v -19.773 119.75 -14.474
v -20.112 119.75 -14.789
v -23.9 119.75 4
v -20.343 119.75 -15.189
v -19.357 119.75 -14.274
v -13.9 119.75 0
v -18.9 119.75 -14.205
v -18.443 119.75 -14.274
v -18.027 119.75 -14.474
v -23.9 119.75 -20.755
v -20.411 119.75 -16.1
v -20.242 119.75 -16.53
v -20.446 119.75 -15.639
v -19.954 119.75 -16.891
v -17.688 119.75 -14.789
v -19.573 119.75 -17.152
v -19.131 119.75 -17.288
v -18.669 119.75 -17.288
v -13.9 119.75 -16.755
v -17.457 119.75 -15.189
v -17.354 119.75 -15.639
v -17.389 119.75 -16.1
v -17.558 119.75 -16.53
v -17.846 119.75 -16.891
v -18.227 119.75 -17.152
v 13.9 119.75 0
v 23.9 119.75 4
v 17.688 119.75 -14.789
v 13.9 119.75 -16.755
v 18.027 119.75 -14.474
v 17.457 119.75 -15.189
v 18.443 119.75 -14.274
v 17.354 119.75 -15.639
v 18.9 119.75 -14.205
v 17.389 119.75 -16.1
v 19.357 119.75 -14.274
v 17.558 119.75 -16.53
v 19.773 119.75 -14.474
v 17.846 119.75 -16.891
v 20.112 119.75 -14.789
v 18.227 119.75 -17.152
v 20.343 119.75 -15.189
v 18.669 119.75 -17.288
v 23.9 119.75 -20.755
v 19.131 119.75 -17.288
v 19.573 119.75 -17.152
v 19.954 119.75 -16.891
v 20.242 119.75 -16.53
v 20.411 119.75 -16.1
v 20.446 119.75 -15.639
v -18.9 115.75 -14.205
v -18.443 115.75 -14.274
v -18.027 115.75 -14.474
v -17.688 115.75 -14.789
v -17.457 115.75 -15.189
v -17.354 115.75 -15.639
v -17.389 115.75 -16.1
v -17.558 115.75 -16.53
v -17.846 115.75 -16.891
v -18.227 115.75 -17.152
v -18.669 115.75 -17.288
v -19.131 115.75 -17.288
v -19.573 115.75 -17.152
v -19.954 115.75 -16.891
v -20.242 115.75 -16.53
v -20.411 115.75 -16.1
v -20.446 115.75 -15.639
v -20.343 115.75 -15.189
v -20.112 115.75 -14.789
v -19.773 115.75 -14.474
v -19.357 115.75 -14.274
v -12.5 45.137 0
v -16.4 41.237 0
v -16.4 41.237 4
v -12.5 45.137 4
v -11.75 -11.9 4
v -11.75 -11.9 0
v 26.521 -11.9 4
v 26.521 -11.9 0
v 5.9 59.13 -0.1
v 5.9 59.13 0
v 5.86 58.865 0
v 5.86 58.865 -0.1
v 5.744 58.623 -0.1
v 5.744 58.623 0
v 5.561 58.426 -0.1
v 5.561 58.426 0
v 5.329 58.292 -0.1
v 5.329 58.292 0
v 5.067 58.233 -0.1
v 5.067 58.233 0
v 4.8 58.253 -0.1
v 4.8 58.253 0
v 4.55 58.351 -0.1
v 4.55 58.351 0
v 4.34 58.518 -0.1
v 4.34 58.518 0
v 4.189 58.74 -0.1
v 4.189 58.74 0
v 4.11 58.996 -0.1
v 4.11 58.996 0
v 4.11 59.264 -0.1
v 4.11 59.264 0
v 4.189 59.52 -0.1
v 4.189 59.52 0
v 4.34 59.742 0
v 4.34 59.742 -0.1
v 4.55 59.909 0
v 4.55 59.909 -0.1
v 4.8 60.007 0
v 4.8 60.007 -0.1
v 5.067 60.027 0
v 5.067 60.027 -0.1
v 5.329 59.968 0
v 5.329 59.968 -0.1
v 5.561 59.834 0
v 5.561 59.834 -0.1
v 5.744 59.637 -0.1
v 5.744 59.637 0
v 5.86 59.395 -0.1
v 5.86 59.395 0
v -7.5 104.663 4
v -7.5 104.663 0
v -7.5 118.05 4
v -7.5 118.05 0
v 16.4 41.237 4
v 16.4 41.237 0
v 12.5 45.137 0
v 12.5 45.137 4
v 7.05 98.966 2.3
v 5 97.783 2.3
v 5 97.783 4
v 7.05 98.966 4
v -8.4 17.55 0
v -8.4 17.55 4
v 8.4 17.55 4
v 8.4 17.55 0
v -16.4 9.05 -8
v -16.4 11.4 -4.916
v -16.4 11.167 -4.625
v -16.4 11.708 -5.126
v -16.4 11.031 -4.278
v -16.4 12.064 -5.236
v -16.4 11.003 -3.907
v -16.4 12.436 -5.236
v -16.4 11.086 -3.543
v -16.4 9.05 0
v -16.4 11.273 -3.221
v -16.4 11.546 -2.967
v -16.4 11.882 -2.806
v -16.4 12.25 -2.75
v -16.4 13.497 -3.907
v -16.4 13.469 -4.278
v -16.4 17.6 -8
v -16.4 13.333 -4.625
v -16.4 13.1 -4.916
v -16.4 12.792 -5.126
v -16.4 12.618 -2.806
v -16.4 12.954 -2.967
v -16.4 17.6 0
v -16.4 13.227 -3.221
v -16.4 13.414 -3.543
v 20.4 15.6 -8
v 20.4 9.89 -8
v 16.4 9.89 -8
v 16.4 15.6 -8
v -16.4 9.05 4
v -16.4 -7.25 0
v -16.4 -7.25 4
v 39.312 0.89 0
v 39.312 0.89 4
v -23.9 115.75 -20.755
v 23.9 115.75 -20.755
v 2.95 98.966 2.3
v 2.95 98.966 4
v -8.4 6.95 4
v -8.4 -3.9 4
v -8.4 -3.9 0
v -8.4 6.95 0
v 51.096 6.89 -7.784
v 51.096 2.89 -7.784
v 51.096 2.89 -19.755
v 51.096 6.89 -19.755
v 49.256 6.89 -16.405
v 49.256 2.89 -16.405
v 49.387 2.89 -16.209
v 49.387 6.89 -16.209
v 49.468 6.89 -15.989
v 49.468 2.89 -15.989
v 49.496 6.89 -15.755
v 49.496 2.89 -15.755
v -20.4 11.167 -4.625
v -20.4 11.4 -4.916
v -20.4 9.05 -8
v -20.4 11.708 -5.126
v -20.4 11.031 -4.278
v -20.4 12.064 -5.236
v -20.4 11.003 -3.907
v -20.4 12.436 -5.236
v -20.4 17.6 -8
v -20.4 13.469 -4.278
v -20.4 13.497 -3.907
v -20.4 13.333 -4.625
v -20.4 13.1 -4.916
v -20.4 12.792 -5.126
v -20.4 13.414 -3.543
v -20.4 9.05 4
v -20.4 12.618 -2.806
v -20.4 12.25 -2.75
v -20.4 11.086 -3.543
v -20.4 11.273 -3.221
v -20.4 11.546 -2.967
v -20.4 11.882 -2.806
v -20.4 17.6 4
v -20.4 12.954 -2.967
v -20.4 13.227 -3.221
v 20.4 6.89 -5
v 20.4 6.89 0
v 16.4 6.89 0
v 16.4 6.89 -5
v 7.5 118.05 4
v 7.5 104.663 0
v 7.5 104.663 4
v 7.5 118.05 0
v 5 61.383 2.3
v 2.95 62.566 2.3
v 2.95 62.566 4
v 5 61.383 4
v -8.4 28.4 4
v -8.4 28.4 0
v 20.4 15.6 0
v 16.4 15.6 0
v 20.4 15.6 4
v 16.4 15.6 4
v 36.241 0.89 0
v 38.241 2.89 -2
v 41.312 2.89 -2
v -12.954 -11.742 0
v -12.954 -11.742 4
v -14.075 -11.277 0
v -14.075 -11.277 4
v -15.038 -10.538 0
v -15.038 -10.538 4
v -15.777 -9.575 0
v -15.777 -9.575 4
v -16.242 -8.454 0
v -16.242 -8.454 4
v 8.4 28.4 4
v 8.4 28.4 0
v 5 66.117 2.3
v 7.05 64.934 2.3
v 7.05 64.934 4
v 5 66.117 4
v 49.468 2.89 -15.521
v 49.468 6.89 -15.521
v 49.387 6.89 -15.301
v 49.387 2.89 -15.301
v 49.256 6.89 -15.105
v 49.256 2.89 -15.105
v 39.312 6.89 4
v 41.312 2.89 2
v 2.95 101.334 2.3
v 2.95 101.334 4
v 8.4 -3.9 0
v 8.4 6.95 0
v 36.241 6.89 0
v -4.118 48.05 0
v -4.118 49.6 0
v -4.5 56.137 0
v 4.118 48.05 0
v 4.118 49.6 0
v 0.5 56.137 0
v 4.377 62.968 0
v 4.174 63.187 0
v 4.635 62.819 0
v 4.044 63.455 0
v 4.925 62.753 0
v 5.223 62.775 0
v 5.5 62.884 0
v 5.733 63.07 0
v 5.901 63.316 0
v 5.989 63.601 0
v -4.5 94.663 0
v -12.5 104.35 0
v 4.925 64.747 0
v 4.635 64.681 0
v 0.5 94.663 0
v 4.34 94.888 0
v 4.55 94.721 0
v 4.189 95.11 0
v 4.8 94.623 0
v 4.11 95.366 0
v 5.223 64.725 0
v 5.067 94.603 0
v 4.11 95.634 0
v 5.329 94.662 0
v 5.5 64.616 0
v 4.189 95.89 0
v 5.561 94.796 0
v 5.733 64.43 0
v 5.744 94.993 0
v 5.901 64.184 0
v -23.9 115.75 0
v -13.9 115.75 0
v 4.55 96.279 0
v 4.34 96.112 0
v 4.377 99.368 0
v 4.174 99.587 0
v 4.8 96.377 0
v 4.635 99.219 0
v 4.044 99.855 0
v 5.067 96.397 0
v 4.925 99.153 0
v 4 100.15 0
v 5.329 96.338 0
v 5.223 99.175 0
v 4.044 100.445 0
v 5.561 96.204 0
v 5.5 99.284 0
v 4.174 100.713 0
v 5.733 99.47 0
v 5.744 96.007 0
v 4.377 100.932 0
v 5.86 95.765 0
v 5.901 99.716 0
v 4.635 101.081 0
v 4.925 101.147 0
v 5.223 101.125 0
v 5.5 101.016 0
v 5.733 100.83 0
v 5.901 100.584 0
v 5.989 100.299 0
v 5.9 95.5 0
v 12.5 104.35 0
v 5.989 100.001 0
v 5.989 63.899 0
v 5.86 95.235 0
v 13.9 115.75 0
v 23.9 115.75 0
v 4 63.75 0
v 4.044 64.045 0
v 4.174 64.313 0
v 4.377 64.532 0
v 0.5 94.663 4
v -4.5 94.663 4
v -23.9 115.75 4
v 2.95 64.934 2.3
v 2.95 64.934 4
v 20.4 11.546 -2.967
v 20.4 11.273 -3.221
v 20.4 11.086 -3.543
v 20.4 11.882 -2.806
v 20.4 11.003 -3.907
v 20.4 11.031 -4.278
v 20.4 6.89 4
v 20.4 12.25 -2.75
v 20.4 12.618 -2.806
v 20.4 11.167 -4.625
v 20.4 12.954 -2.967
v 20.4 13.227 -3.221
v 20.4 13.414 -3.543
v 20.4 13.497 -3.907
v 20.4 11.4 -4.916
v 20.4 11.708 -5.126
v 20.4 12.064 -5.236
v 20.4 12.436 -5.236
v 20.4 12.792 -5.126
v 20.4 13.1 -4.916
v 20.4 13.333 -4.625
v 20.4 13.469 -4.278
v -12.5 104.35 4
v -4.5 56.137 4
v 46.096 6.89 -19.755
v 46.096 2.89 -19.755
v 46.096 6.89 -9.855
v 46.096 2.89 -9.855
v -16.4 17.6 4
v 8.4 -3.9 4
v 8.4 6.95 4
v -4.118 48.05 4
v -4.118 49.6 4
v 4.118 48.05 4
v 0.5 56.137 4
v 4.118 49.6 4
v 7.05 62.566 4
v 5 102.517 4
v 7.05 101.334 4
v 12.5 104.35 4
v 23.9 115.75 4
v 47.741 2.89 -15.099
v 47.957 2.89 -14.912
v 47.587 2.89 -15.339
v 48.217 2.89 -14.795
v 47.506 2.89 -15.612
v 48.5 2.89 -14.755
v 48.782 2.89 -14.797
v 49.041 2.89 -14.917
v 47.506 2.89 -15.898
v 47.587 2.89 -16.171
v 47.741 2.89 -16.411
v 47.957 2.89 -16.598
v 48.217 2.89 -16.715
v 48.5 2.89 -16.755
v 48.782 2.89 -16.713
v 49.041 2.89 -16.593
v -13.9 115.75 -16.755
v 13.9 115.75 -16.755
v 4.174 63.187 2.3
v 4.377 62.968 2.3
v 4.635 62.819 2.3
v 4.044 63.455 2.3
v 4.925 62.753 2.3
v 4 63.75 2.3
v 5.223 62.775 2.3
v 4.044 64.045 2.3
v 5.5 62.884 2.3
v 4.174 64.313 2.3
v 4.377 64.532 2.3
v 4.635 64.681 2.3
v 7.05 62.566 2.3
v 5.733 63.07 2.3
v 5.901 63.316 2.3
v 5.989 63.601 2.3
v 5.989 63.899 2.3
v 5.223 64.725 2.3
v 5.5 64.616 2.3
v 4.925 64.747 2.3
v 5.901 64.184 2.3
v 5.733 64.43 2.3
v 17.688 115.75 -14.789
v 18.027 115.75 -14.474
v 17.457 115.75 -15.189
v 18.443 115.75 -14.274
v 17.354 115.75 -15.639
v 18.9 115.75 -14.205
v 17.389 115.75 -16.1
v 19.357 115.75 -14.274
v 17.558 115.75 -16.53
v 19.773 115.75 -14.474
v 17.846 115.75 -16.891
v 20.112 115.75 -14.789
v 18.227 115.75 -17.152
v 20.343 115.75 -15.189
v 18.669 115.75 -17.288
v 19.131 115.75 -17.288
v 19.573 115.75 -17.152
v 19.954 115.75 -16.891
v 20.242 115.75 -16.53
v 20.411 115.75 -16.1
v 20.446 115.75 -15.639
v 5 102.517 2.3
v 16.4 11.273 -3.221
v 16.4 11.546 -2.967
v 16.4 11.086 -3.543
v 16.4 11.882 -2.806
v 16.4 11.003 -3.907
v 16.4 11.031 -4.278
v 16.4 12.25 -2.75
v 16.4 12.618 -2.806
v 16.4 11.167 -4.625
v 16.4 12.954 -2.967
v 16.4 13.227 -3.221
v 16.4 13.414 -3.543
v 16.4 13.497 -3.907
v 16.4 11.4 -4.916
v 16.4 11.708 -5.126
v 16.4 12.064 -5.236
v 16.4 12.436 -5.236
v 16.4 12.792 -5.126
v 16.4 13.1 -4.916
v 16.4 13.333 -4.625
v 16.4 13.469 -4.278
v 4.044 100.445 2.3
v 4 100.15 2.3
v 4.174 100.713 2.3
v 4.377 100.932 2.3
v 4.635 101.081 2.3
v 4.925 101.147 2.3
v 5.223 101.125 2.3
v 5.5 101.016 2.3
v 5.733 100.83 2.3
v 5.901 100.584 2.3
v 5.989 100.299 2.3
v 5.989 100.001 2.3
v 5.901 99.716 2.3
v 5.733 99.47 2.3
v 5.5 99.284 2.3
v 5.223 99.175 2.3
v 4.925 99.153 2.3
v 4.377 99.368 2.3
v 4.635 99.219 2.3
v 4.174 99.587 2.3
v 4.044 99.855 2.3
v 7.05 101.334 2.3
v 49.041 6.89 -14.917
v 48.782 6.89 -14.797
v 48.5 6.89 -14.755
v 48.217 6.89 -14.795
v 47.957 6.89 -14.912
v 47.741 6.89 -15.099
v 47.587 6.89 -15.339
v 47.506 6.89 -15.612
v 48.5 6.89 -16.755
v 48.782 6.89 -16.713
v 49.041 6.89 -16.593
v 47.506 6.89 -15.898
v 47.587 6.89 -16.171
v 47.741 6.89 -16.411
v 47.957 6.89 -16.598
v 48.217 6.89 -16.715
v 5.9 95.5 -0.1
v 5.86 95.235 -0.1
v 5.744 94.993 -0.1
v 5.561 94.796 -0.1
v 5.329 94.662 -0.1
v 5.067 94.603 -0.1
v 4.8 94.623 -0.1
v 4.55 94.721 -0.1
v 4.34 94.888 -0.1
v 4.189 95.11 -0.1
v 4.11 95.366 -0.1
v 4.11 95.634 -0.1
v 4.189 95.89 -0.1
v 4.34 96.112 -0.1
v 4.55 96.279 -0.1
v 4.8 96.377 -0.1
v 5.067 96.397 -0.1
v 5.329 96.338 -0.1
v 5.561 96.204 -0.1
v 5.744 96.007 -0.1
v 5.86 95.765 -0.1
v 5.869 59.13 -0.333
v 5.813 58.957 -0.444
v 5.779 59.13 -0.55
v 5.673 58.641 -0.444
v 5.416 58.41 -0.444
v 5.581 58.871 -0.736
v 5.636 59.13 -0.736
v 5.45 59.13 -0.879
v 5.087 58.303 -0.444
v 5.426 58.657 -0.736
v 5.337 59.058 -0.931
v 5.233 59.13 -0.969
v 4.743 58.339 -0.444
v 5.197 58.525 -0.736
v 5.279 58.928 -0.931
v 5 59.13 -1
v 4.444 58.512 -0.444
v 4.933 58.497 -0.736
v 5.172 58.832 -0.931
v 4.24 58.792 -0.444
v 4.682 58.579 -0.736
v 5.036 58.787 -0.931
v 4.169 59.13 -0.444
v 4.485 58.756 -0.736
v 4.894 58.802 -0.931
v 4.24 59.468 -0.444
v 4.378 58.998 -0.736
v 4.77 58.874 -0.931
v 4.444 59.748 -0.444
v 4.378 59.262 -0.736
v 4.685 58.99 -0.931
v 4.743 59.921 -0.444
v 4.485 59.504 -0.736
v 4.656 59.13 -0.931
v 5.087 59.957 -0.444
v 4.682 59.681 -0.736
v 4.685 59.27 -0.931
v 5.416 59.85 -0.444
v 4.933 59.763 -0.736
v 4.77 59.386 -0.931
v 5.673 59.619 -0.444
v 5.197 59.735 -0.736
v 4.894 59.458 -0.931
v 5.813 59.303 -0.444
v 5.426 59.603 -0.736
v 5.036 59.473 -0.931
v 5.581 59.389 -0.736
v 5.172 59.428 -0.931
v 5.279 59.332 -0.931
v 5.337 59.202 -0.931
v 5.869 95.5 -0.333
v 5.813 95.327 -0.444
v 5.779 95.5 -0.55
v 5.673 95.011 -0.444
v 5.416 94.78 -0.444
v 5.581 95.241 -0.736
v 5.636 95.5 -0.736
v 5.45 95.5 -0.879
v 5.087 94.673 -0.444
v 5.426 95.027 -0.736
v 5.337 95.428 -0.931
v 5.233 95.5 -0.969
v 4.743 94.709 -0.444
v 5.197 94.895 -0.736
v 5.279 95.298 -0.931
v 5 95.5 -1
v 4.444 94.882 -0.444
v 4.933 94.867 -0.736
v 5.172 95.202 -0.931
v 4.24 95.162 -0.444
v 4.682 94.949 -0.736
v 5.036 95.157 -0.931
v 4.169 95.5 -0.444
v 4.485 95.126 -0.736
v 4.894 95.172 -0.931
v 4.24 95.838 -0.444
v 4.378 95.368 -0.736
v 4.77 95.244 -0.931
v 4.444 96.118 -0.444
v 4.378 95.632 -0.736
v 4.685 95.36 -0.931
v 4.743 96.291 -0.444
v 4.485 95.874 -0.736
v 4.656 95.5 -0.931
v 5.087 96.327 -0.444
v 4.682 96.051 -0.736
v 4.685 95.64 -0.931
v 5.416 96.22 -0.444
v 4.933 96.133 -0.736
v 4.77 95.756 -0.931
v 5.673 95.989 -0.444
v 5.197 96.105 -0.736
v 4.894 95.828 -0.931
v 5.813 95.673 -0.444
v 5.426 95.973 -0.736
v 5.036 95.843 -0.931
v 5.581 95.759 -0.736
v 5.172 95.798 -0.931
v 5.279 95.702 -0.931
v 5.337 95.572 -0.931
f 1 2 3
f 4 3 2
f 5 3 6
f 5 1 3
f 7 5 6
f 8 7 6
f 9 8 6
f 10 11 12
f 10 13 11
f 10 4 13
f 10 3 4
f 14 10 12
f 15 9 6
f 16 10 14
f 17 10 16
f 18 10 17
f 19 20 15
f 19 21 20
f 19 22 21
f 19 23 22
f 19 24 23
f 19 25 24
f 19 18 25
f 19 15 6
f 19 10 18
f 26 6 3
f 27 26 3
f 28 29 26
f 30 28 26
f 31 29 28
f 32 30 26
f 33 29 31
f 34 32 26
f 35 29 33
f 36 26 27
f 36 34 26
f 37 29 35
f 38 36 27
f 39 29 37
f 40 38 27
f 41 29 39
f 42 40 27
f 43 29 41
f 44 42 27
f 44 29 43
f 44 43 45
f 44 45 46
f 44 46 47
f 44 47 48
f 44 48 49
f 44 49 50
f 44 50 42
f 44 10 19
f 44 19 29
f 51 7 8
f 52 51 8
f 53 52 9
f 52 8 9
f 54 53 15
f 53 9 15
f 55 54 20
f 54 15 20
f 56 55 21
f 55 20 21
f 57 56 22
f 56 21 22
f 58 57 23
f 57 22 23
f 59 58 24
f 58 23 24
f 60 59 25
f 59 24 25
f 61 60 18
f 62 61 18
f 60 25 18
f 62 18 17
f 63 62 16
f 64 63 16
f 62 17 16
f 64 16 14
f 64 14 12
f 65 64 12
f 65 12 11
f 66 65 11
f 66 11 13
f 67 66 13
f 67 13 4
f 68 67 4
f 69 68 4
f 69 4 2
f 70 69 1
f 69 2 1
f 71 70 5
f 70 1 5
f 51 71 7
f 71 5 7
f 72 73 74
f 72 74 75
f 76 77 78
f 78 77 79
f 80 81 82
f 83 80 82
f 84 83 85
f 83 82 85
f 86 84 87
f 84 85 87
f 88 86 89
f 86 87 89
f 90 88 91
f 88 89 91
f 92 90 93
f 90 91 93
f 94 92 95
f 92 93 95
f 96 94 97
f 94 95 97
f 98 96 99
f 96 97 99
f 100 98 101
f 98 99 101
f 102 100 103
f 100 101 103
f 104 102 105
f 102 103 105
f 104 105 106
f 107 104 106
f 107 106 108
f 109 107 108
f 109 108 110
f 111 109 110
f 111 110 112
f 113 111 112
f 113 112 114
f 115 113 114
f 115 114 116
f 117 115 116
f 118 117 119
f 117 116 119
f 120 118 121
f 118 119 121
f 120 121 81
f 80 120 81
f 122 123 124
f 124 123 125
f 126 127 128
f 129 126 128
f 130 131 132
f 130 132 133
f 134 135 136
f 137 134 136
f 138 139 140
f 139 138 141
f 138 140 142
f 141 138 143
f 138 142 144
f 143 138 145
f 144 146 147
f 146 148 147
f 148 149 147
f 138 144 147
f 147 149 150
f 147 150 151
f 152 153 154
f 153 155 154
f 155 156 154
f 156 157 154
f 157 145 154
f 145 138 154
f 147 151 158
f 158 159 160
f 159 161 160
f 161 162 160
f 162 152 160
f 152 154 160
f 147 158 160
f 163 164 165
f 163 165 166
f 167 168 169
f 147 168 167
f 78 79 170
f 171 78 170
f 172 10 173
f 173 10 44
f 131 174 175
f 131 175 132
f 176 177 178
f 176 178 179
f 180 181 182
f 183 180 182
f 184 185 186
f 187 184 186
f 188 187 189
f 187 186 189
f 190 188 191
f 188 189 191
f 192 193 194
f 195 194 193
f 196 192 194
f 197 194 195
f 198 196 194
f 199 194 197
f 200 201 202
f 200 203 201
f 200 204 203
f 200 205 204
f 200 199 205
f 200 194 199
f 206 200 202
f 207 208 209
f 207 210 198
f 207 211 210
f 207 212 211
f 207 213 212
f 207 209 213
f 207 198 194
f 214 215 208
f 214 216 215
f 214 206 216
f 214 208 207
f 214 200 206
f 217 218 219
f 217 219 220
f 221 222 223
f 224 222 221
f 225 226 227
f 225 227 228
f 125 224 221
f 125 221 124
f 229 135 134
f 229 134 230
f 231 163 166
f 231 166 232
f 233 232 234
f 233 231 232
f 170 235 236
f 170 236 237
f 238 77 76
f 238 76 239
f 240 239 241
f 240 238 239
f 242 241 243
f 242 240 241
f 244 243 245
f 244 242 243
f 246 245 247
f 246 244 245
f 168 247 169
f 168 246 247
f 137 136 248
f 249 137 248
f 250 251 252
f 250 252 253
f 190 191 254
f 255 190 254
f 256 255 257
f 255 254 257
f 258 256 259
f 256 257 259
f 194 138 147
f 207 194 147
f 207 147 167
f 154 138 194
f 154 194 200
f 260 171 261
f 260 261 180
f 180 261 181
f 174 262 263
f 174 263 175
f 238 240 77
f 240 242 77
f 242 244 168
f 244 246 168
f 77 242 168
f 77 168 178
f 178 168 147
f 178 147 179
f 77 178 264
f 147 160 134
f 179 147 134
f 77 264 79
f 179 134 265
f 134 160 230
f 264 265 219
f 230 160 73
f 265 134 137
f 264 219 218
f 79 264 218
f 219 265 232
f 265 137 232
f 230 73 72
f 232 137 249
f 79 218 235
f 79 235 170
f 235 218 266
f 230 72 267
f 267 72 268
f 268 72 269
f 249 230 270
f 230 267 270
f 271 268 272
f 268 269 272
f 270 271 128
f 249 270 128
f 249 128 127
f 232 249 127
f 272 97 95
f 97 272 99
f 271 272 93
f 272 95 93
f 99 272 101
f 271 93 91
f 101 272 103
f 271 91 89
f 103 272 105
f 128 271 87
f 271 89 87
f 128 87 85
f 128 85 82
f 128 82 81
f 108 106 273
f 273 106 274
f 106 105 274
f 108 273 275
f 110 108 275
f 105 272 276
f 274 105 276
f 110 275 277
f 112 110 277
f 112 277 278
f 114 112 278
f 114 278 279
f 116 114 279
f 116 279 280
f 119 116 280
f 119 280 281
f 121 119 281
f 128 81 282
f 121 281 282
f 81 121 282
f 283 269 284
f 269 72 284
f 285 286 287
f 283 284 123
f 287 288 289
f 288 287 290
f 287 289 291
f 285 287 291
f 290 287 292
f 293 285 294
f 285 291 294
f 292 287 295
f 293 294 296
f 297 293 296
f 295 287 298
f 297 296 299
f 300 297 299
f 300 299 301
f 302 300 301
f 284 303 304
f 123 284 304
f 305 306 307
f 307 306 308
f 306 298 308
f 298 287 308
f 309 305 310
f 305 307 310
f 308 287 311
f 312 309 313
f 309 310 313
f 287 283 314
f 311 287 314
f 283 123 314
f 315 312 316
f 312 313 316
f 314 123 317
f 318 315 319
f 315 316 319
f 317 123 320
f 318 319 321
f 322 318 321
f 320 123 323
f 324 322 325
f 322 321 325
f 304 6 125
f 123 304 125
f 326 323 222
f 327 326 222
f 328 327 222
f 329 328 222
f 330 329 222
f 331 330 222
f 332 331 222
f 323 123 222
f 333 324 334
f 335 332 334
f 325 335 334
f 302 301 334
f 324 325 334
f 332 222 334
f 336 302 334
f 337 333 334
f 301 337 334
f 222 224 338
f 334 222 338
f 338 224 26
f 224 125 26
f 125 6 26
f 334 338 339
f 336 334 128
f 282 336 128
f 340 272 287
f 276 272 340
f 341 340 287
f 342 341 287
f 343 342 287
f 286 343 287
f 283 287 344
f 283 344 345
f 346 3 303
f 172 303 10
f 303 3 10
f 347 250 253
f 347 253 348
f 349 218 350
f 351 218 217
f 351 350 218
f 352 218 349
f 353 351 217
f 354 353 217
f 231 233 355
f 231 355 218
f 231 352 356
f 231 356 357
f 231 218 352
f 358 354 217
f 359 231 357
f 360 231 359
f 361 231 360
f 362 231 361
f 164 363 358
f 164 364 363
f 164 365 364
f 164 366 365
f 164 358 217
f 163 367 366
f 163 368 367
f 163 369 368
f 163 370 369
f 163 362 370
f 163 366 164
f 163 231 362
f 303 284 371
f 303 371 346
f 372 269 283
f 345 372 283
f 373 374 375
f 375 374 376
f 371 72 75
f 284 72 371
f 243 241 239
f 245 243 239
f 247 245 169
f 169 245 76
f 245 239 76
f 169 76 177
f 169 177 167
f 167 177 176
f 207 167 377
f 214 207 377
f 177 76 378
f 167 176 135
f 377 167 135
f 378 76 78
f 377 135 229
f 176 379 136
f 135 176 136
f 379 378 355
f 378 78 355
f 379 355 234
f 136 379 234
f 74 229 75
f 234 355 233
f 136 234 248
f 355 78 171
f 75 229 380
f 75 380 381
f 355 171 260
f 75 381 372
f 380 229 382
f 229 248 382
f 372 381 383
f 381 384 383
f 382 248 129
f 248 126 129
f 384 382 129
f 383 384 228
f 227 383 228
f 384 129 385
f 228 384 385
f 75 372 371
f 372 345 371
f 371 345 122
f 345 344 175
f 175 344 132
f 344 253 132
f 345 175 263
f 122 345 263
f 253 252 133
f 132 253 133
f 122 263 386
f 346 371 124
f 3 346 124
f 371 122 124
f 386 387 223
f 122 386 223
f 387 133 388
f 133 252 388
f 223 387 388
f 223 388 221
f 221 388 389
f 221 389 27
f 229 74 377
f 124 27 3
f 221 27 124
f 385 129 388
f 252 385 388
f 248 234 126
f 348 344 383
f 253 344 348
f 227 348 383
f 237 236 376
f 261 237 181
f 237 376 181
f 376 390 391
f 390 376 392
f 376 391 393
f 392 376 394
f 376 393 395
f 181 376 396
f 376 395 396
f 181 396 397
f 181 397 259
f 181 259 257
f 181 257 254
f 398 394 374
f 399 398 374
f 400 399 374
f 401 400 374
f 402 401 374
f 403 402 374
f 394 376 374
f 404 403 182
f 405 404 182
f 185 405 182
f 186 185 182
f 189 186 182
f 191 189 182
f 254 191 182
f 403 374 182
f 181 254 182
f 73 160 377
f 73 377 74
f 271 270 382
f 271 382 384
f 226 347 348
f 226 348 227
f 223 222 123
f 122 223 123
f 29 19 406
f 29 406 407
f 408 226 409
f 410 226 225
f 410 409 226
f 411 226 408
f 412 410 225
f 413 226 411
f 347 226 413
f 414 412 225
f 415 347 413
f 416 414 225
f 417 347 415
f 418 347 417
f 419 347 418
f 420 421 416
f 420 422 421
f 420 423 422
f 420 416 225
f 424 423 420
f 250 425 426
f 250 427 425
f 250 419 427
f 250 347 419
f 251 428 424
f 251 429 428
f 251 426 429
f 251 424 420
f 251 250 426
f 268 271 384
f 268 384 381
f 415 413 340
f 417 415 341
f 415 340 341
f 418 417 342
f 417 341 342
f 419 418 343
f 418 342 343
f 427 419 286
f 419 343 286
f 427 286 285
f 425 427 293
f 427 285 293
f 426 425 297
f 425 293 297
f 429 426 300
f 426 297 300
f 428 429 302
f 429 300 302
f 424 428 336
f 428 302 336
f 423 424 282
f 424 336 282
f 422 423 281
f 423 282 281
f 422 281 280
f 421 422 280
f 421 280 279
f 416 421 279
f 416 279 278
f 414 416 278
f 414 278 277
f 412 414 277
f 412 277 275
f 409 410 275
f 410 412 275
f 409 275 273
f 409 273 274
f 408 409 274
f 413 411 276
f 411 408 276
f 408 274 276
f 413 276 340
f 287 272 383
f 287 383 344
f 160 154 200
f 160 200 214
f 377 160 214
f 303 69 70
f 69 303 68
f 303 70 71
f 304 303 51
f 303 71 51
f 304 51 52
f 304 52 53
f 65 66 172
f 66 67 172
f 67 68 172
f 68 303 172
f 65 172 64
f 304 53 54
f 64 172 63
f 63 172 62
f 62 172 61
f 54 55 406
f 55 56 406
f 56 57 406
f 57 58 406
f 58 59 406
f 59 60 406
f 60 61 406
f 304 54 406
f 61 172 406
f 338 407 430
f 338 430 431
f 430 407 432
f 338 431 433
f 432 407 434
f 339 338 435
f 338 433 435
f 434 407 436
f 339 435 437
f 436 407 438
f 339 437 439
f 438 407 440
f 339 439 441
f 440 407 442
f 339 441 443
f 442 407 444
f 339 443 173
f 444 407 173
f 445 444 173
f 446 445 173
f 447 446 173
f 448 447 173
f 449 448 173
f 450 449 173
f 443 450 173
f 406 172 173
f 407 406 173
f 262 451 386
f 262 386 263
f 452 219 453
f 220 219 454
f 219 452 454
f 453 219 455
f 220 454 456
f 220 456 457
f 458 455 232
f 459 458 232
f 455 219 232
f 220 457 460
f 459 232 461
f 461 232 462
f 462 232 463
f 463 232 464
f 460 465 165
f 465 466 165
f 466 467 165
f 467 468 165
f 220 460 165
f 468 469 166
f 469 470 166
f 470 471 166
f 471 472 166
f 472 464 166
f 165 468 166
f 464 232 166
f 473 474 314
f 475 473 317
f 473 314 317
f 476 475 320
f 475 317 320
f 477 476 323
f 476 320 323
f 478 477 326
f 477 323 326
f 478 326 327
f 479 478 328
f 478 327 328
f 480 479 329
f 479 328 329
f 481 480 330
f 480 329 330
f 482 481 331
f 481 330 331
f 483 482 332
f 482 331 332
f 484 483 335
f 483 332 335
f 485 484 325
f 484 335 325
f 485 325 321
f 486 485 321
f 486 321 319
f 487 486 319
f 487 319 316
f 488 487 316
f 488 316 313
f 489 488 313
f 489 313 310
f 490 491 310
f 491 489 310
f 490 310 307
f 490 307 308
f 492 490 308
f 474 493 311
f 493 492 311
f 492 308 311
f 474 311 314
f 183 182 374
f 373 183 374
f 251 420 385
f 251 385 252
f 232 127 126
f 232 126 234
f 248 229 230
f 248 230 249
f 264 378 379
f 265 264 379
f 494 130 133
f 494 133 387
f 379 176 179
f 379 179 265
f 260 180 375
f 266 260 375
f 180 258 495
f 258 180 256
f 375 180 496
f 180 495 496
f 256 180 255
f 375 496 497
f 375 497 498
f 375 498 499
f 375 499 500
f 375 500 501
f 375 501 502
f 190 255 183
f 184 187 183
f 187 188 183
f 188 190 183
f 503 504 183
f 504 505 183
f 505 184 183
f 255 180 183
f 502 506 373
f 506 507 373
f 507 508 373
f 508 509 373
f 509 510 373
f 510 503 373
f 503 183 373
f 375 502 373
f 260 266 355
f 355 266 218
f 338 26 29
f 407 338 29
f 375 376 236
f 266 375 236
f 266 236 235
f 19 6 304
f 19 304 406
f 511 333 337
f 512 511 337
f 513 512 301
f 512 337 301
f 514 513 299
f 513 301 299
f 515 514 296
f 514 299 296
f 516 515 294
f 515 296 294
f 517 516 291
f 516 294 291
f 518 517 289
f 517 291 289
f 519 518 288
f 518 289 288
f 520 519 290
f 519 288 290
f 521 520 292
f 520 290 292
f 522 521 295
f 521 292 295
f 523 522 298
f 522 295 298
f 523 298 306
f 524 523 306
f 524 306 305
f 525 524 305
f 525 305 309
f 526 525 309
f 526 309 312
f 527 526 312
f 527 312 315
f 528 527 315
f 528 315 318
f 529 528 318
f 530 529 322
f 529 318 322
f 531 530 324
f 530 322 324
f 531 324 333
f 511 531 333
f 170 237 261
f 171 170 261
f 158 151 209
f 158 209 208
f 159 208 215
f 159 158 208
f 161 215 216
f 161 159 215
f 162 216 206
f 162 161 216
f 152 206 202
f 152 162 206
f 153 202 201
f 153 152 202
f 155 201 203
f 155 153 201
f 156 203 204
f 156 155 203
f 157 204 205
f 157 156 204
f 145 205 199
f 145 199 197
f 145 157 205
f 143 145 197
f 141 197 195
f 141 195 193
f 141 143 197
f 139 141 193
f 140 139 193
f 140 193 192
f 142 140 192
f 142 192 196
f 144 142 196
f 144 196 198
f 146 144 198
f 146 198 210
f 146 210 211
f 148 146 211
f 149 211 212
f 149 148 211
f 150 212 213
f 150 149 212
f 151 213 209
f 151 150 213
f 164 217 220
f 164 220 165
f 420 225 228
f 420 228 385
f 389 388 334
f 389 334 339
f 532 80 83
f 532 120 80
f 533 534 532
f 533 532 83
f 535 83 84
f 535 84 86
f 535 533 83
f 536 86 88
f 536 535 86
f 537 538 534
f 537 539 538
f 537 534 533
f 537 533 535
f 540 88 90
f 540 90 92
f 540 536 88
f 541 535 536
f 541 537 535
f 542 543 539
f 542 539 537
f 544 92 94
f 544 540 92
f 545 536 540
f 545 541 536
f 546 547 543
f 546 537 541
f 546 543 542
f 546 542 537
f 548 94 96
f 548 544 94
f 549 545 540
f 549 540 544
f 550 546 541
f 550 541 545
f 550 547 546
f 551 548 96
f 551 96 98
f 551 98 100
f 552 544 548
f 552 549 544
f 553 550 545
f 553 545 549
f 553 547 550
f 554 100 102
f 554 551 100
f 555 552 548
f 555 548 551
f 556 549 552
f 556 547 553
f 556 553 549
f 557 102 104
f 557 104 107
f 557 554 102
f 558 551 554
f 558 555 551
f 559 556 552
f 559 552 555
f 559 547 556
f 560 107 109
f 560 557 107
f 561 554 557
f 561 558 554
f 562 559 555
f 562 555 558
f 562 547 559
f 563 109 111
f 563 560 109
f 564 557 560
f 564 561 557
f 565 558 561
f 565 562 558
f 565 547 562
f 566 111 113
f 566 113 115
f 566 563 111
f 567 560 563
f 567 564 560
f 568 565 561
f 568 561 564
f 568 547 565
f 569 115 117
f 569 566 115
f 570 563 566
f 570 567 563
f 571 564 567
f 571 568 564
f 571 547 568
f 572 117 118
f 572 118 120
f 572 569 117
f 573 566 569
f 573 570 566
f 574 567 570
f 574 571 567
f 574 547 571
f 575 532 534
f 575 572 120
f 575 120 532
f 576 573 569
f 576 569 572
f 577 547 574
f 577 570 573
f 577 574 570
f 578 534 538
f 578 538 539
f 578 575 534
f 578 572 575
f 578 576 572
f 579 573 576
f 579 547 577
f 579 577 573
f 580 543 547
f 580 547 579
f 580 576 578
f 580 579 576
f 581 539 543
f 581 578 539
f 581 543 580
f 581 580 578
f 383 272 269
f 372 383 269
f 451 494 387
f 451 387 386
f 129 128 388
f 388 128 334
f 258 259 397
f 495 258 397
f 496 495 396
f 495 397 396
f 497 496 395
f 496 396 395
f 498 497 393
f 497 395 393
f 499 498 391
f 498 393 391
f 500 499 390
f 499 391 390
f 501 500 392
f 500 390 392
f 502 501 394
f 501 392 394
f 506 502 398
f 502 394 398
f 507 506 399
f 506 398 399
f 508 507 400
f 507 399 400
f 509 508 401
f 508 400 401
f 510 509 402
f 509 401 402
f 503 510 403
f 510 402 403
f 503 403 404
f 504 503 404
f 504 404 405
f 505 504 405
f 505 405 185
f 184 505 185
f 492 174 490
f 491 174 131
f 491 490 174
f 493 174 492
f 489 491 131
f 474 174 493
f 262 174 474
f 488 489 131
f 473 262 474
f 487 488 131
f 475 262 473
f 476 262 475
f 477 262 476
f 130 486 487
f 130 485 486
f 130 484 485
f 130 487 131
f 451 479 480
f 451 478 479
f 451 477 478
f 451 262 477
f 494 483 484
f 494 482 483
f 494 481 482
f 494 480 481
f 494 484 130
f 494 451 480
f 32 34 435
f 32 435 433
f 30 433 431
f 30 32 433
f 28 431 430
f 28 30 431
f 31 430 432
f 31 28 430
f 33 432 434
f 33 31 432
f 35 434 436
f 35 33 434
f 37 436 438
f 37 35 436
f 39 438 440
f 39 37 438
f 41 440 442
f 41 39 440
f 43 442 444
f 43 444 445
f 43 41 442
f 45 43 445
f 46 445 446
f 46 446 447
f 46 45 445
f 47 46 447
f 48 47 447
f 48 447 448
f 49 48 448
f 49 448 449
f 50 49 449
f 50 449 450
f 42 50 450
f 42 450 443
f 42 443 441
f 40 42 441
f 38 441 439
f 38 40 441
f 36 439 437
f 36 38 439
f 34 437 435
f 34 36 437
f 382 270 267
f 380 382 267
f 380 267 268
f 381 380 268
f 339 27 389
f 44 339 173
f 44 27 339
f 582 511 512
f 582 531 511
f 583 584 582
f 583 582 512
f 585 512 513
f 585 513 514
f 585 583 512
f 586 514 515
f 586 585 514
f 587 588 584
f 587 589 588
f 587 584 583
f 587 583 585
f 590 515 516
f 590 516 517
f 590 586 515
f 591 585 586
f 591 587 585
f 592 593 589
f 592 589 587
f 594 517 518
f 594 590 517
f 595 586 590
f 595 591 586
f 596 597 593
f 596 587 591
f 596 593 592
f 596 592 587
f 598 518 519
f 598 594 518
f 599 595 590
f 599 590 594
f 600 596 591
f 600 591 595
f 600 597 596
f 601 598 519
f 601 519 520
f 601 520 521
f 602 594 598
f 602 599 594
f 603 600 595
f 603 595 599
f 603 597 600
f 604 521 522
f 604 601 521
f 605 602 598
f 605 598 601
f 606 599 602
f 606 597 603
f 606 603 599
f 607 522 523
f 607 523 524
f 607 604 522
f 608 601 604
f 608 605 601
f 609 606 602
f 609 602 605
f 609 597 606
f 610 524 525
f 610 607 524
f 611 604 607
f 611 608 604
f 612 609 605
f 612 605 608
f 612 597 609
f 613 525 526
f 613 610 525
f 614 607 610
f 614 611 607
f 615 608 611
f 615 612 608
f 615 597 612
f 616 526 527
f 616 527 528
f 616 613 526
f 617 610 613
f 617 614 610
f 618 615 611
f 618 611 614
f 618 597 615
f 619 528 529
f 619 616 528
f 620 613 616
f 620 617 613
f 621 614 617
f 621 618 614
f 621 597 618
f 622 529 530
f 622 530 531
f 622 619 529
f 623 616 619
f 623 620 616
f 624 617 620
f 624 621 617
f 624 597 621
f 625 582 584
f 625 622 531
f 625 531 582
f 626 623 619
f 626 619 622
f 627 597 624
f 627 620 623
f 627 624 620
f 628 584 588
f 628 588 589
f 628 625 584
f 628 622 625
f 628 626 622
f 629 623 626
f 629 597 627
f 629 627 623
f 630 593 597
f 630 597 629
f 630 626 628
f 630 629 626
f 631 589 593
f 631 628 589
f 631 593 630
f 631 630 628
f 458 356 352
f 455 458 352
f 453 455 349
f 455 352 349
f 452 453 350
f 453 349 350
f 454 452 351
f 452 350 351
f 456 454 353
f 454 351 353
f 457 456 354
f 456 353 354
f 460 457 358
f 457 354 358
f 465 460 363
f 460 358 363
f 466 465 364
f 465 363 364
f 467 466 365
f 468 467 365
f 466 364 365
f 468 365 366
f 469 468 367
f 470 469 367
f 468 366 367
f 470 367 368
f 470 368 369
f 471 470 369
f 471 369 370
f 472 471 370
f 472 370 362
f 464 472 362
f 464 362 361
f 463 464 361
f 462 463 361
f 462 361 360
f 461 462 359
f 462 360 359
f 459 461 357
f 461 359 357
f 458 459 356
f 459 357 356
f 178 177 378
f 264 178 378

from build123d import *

# Parameters (mm, degrees)
EXTRUDE_1_DEPTH     = 4
SKETCH_2_W          = 15
SKETCH_2_H          = 13.3866
CUT_EXTRUDE_1_DEPTH = 121.93395925
SKETCH_3_W          = 10
SKETCH_3_H          = 10
SKETCH_3_R          = 1.55
SKETCH_3_H_2        = 14.755
EXTRUDE_2_DEPTH     = 4
EXTRUDE_3_DEPTH     = 4
EXTRUDE_4_DEPTH     = 4
SKETCH_7_W          = 27.8
SKETCH_7_H          = 4
EXTRUDE_5_DEPTH     = 4
EXTRUDE_START       = -4
EXTRUDE_6_DEPTH     = 4
SKETCH_11_W         = 16.8
SKETCH_11_H         = 10.85
CUT_EXTRUDE_2_DEPTH = 133.52791749
CHAMFER_1_SIZE      = 2
CHAMFER_2_SIZE      = 2
SKETCH_12_W         = 12
SKETCH_12_H         = 8.55
SKETCH_12_R         = 1.25
EXTRUDE_7_DEPTH     = 4
EXTRUDE_START_2     = 4
SKETCH_13_R         = 1.25
SKETCH_13_W         = 4
SKETCH_13_H         = 8.709663749
EXTRUDE_8_DEPTH     = 4
SKETCH_14_R         = 1
CUT_EXTRUDE_3_DEPTH = 132.839329922
SKETCH_15_R         = 0.9
EXTRUDE_9_DEPTH     = 1
FILLET_1_R          = 0.9
CUT_EXTRUDE_START   = -1.7
SKETCH_16_R         = 1
CUT_EXTRUDE_4_DEPTH = 1.7
CUT_EXTRUDE_5_DEPTH = 132.839329922
SKETCH_19_W         = 5
SKETCH_19_H         = 38.5268
SKETCH_19_W_2       = 8.236887868
SKETCH_19_H_2       = 1.55
CUT_EXTRUDE_6_DEPTH = 132.839329922


with BuildPart() as part:
    # 草图1 → 凸台-拉伸1 (new body)
    with BuildSketch(Plane.XY):
        with BuildLine():
            Line((-16.4, -7.25), (-16.4, 119.75))
            Line((-16.4, 119.75), (16.4, 119.75))
            Line((16.4, 119.75), (16.4, -7.25))
            ThreePointArc((16.4, -7.25), (15.038046533, -10.538046533), (11.75, -11.9))
            Line((11.75, -11.9), (-11.75, -11.9))
            ThreePointArc((-11.75, -11.9), (-15.038046533, -10.538046533), (-16.4, -7.25))
        make_face()
    extrude(amount=EXTRUDE_1_DEPTH)

    # 草图2 → 切除-拉伸1 (cut, through all)
    with BuildSketch(Plane(origin=(0, 0, 0), x_dir=(-1, 0, 0), z_dir=(0, 0, -1))):
        with Locations((0, 111.3567)):
            Rectangle(SKETCH_2_W, SKETCH_2_H)
    extrude(amount=-CUT_EXTRUDE_1_DEPTH, mode=Mode.SUBTRACT)

    # 草图3 → 凸台-拉伸2 (add)
    # profile 1 of 2: a face of its own
    with BuildSketch(Plane(origin=(0, 119.75, 0), x_dir=(1, 0, 0), z_dir=(0, 1, 0))):
        with Locations((-18.9, 15.755)):
            Rectangle(SKETCH_3_W, SKETCH_3_H)
        with Locations(Location((-18.9, 15.755, 0), (0, 0, 270))):
            Circle(SKETCH_3_R, mode=Mode.SUBTRACT)
    # profile 2 of 2: a face of its own
    with BuildSketch(Plane(origin=(0, 119.75, 0), x_dir=(1, 0, 0), z_dir=(0, 1, 0))):
        with Locations((-18.9, 3.3775)):
            Rectangle(SKETCH_3_W, SKETCH_3_H_2)
    extrude_2 = extrude(amount=-EXTRUDE_2_DEPTH)

    # 镜向1: 凸台-拉伸2 across plane
    add(extrude_2.mirror(Plane(origin=(0, 0, 0), x_dir=(0, 0, 1), z_dir=(1, 0, 0))))

    # 草图6 → 凸台-拉伸4 (add)
    with BuildSketch(Plane.XY.offset(4)):
        Polygon((-16.4, 115.75), (-23.9, 115.75), (-16.4, 108.25), align=None)
        Polygon((16.4, 115.75), (16.4, 108.25), (23.9, 115.75), align=None)
    extrude(amount=-EXTRUDE_4_DEPTH)

    # 草图7 → 凸台-拉伸5 (add)
    with BuildSketch(Plane(origin=(0, 119.75, 0), x_dir=(1, 0, 0), z_dir=(0, 1, 0))):
        with Locations((0, 18.755)):
            Rectangle(SKETCH_7_W, SKETCH_7_H)
    extrude(amount=-EXTRUDE_5_DEPTH)



with BuildPart() as body_2:
    # 草图5 → 凸台-拉伸3 (new body)
    with BuildSketch(Plane(origin=(0, 2.890336251, 0), x_dir=(1, 0, 0), z_dir=(0, 1, 0))):
        Polygon((50.795757056, 9.855), (46.095757056, 9.855), (32.240757056, -4), (39.311824868, -4), (51.095757056, 7.783932188), (51.095757056, 9.855), align=None)
        with BuildLine():
            Line((50.795757056, 19.755), (46.095757056, 19.755))
            Line((46.095757056, 19.755), (46.095757056, 9.855))
            Line((46.095757056, 9.855), (50.795757056, 9.855))
            Line((50.795757056, 9.855), (50.795757056, 15.105))
            Line((50.795757056, 15.105), (49.255691264, 15.105))
            ThreePointArc((49.255691264, 15.105), (47.495757056, 15.755), (49.255691264, 16.405))
            Line((49.255691264, 16.405), (50.795757056, 16.405))
            Line((50.795757056, 16.405), (50.795757056, 19.755))
        make_face()
        with BuildLine():
            Line((51.095757056, 19.755), (50.795757056, 19.755))
            Line((50.795757056, 19.755), (50.795757056, 16.405))
            Line((50.795757056, 16.405), (49.255691264, 16.405))
            ThreePointArc((49.255691264, 16.405), (49.433822674, 16.10145764), (49.495757056, 15.755))
            ThreePointArc((49.495757056, 15.755), (49.433822674, 15.40854236), (49.255691264, 15.105))
            Line((49.255691264, 15.105), (50.795757056, 15.105))
            Line((50.795757056, 15.105), (50.795757056, 9.855))
            Line((50.795757056, 9.855), (51.095757056, 9.855))
            Line((51.095757056, 9.855), (51.095757056, 19.755))
        make_face()
    extrude(amount=EXTRUDE_3_DEPTH)


with BuildPart() as part_1:
    add(part.part)

    add(body_2.part)  # 凸台-拉伸6 merges body 2
    # 草图8 → 凸台-拉伸6 (add)
    with BuildSketch(Plane.XY.offset(4).offset(EXTRUDE_START)):
        with BuildLine():
            Line((26.521488617, -11.9), (39.311824868, 0.890336251))
            Line((39.311824868, 0.890336251), (39.311824868, 6.890336251))
            Line((39.311824868, 6.890336251), (16.4, 6.890336251))
            Line((16.4, 6.890336251), (16.4, -7.25))
            ThreePointArc((16.4, -7.25), (15.038046533, -10.538046533), (11.75, -11.9))
            Line((11.75, -11.9), (26.521488617, -11.9))
        make_face()
    extrude(amount=EXTRUDE_6_DEPTH)

    # 草图11 → 切除-拉伸2 (cut, through all)
    with BuildSketch(Plane.XY.offset(4)):
        with Locations((0, 1.525)):
            Rectangle(SKETCH_11_W, SKETCH_11_H)
        with Locations((0, 22.975)):
            Rectangle(SKETCH_11_W, SKETCH_11_H)
    extrude(amount=-CUT_EXTRUDE_2_DEPTH, mode=Mode.SUBTRACT)

    # 倒角1
    chamfer_1_edges = [part_1.edges().sort_by_distance(p)[0] for p in [
        (39.311824868, 2.890336251, 2),
    ]]
    chamfer(chamfer_1_edges, length=CHAMFER_1_SIZE - 0.0001)  # a hair under: the kernel refuses the full size

    # 倒角2
    chamfer_2_edges = [part_1.edges().sort_by_distance(p)[0] for p in [
        (38.776240962, 2.890336251, 0),
    ]]
    chamfer(chamfer_2_edges, length=CHAMFER_2_SIZE - 0.0001)  # a hair under: the kernel refuses the full size

    # 草图12 → 凸台-拉伸7 (add)
    with BuildSketch(Plane.ZY.offset(16.4)):
        with Locations((-2, 13.325)):
            Rectangle(SKETCH_12_W, SKETCH_12_H)
        with Locations((-4, 12.25)):
            Circle(SKETCH_12_R, mode=Mode.SUBTRACT)
    extrude(amount=EXTRUDE_7_DEPTH)

    # 草图13 → 凸台-拉伸8 (add)
    # profile 1 of 2: a face of its own
    with BuildSketch(Plane(origin=(16.4, 0, 0), x_dir=(0, 0, -1), z_dir=(1, 0, 0)).offset(EXTRUDE_START_2)):
        Polygon((8, 9.890336251), (8, 15.6), (0, 15.6), (0, 6.890336251), (5, 6.890336251), align=None)
        with Locations(Location((4, 12.25, 0), (0, 0, 180))):
            Circle(SKETCH_13_R, mode=Mode.SUBTRACT)
    # profile 2 of 2: a face of its own
    with BuildSketch(Plane(origin=(16.4, 0, 0), x_dir=(0, 0, -1), z_dir=(1, 0, 0)).offset(EXTRUDE_START_2)):
        with Locations((-2, 11.245168126)):
            Rectangle(SKETCH_13_W, SKETCH_13_H)
    extrude(amount=-EXTRUDE_8_DEPTH)

    # 草图14 → 切除-拉伸3 (cut, through all)
    with BuildSketch(Plane(origin=(0, 0, 0), x_dir=(-1, 0, 0), z_dir=(0, 0, -1))):
        with Locations((-5, 63.75)):
            Circle(SKETCH_14_R)
        with Locations((-5, 100.15)):
            Circle(SKETCH_14_R)
    extrude(amount=-CUT_EXTRUDE_3_DEPTH, mode=Mode.SUBTRACT)

    # 草图15 → 凸台-拉伸9 (add)
    with BuildSketch(Plane(origin=(0, 0, 0), x_dir=(-1, 0, 0), z_dir=(0, 0, -1))):
        with Locations(Location((-5, 95.5, 0), (0, 0, 180))):
            Circle(SKETCH_15_R)
        with Locations(Location((-5, 59.13, 0), (0, 0, 180))):
            Circle(SKETCH_15_R)
    extrude(amount=EXTRUDE_9_DEPTH)

    # 圆角1
    fillet_1_edges = [part_1.edges().sort_by_distance(p)[0] for p in [
        (4.1, 95.5, -1),
        (4.1, 59.13, -1),
    ]]
    fillet(fillet_1_edges, radius=FILLET_1_R)

    # 草图16 → 切除-拉伸4 (cut)
    # profile 1 of 2: a face of its own
    with BuildSketch(Plane.XY.offset(4).offset(CUT_EXTRUDE_START)):
        Polygon((7.05, 62.566431948), (7.05, 64.933568052), (5, 66.117136104), (2.95, 64.933568052), (2.95, 62.566431948), (5, 61.382863896), align=None)
        with Locations(Location((5, 63.75, 0), (0, 0, 180))):
            Circle(SKETCH_16_R, mode=Mode.SUBTRACT)
    # profile 2 of 2: a face of its own
    with BuildSketch(Plane.XY.offset(4).offset(CUT_EXTRUDE_START)):
        Polygon((2.95, 98.966431948), (5, 97.782863896), (7.05, 98.966431948), (7.05, 101.333568052), (5, 102.517136104), (2.95, 101.333568052), align=None)
        with Locations(Location((5, 100.15, 0), (0, 0, 180))):
            Circle(SKETCH_16_R, mode=Mode.SUBTRACT)
    extrude(amount=CUT_EXTRUDE_4_DEPTH, mode=Mode.SUBTRACT)

    # 草图17 → 切除-拉伸5 (cut, symmetric)
    with BuildSketch(Plane(origin=(0, 0, 0), x_dir=(-1, 0, 0), z_dir=(0, 0, -1))):
        Polygon((-12.5, 104.35), (-16.4, 108.25), (-16.4, 41.2366), (-12.5, 45.1366), align=None)
    cut_extrude_5 = extrude(amount=CUT_EXTRUDE_5_DEPTH, both=True, mode=Mode.SUBTRACT)

    # 镜向2: 切除-拉伸5 across plane
    add(cut_extrude_5.mirror(Plane(origin=(0, 0, 0), x_dir=(0, 0, 1), z_dir=(1, 0, 0))), mode=Mode.SUBTRACT)

    # 草图19 → 切除-拉伸6 (cut, through all)
    with BuildSketch(Plane(origin=(0, 0, 0), x_dir=(-1, 0, 0), z_dir=(0, 0, -1))):
        with Locations((2, 75.4)):
            Rectangle(SKETCH_19_W, SKETCH_19_H)
        with Locations((0, 48.825)):
            Rectangle(SKETCH_19_W_2, SKETCH_19_H_2)
    extrude(amount=-CUT_EXTRUDE_6_DEPTH, mode=Mode.SUBTRACT)


solid = part_1.part
